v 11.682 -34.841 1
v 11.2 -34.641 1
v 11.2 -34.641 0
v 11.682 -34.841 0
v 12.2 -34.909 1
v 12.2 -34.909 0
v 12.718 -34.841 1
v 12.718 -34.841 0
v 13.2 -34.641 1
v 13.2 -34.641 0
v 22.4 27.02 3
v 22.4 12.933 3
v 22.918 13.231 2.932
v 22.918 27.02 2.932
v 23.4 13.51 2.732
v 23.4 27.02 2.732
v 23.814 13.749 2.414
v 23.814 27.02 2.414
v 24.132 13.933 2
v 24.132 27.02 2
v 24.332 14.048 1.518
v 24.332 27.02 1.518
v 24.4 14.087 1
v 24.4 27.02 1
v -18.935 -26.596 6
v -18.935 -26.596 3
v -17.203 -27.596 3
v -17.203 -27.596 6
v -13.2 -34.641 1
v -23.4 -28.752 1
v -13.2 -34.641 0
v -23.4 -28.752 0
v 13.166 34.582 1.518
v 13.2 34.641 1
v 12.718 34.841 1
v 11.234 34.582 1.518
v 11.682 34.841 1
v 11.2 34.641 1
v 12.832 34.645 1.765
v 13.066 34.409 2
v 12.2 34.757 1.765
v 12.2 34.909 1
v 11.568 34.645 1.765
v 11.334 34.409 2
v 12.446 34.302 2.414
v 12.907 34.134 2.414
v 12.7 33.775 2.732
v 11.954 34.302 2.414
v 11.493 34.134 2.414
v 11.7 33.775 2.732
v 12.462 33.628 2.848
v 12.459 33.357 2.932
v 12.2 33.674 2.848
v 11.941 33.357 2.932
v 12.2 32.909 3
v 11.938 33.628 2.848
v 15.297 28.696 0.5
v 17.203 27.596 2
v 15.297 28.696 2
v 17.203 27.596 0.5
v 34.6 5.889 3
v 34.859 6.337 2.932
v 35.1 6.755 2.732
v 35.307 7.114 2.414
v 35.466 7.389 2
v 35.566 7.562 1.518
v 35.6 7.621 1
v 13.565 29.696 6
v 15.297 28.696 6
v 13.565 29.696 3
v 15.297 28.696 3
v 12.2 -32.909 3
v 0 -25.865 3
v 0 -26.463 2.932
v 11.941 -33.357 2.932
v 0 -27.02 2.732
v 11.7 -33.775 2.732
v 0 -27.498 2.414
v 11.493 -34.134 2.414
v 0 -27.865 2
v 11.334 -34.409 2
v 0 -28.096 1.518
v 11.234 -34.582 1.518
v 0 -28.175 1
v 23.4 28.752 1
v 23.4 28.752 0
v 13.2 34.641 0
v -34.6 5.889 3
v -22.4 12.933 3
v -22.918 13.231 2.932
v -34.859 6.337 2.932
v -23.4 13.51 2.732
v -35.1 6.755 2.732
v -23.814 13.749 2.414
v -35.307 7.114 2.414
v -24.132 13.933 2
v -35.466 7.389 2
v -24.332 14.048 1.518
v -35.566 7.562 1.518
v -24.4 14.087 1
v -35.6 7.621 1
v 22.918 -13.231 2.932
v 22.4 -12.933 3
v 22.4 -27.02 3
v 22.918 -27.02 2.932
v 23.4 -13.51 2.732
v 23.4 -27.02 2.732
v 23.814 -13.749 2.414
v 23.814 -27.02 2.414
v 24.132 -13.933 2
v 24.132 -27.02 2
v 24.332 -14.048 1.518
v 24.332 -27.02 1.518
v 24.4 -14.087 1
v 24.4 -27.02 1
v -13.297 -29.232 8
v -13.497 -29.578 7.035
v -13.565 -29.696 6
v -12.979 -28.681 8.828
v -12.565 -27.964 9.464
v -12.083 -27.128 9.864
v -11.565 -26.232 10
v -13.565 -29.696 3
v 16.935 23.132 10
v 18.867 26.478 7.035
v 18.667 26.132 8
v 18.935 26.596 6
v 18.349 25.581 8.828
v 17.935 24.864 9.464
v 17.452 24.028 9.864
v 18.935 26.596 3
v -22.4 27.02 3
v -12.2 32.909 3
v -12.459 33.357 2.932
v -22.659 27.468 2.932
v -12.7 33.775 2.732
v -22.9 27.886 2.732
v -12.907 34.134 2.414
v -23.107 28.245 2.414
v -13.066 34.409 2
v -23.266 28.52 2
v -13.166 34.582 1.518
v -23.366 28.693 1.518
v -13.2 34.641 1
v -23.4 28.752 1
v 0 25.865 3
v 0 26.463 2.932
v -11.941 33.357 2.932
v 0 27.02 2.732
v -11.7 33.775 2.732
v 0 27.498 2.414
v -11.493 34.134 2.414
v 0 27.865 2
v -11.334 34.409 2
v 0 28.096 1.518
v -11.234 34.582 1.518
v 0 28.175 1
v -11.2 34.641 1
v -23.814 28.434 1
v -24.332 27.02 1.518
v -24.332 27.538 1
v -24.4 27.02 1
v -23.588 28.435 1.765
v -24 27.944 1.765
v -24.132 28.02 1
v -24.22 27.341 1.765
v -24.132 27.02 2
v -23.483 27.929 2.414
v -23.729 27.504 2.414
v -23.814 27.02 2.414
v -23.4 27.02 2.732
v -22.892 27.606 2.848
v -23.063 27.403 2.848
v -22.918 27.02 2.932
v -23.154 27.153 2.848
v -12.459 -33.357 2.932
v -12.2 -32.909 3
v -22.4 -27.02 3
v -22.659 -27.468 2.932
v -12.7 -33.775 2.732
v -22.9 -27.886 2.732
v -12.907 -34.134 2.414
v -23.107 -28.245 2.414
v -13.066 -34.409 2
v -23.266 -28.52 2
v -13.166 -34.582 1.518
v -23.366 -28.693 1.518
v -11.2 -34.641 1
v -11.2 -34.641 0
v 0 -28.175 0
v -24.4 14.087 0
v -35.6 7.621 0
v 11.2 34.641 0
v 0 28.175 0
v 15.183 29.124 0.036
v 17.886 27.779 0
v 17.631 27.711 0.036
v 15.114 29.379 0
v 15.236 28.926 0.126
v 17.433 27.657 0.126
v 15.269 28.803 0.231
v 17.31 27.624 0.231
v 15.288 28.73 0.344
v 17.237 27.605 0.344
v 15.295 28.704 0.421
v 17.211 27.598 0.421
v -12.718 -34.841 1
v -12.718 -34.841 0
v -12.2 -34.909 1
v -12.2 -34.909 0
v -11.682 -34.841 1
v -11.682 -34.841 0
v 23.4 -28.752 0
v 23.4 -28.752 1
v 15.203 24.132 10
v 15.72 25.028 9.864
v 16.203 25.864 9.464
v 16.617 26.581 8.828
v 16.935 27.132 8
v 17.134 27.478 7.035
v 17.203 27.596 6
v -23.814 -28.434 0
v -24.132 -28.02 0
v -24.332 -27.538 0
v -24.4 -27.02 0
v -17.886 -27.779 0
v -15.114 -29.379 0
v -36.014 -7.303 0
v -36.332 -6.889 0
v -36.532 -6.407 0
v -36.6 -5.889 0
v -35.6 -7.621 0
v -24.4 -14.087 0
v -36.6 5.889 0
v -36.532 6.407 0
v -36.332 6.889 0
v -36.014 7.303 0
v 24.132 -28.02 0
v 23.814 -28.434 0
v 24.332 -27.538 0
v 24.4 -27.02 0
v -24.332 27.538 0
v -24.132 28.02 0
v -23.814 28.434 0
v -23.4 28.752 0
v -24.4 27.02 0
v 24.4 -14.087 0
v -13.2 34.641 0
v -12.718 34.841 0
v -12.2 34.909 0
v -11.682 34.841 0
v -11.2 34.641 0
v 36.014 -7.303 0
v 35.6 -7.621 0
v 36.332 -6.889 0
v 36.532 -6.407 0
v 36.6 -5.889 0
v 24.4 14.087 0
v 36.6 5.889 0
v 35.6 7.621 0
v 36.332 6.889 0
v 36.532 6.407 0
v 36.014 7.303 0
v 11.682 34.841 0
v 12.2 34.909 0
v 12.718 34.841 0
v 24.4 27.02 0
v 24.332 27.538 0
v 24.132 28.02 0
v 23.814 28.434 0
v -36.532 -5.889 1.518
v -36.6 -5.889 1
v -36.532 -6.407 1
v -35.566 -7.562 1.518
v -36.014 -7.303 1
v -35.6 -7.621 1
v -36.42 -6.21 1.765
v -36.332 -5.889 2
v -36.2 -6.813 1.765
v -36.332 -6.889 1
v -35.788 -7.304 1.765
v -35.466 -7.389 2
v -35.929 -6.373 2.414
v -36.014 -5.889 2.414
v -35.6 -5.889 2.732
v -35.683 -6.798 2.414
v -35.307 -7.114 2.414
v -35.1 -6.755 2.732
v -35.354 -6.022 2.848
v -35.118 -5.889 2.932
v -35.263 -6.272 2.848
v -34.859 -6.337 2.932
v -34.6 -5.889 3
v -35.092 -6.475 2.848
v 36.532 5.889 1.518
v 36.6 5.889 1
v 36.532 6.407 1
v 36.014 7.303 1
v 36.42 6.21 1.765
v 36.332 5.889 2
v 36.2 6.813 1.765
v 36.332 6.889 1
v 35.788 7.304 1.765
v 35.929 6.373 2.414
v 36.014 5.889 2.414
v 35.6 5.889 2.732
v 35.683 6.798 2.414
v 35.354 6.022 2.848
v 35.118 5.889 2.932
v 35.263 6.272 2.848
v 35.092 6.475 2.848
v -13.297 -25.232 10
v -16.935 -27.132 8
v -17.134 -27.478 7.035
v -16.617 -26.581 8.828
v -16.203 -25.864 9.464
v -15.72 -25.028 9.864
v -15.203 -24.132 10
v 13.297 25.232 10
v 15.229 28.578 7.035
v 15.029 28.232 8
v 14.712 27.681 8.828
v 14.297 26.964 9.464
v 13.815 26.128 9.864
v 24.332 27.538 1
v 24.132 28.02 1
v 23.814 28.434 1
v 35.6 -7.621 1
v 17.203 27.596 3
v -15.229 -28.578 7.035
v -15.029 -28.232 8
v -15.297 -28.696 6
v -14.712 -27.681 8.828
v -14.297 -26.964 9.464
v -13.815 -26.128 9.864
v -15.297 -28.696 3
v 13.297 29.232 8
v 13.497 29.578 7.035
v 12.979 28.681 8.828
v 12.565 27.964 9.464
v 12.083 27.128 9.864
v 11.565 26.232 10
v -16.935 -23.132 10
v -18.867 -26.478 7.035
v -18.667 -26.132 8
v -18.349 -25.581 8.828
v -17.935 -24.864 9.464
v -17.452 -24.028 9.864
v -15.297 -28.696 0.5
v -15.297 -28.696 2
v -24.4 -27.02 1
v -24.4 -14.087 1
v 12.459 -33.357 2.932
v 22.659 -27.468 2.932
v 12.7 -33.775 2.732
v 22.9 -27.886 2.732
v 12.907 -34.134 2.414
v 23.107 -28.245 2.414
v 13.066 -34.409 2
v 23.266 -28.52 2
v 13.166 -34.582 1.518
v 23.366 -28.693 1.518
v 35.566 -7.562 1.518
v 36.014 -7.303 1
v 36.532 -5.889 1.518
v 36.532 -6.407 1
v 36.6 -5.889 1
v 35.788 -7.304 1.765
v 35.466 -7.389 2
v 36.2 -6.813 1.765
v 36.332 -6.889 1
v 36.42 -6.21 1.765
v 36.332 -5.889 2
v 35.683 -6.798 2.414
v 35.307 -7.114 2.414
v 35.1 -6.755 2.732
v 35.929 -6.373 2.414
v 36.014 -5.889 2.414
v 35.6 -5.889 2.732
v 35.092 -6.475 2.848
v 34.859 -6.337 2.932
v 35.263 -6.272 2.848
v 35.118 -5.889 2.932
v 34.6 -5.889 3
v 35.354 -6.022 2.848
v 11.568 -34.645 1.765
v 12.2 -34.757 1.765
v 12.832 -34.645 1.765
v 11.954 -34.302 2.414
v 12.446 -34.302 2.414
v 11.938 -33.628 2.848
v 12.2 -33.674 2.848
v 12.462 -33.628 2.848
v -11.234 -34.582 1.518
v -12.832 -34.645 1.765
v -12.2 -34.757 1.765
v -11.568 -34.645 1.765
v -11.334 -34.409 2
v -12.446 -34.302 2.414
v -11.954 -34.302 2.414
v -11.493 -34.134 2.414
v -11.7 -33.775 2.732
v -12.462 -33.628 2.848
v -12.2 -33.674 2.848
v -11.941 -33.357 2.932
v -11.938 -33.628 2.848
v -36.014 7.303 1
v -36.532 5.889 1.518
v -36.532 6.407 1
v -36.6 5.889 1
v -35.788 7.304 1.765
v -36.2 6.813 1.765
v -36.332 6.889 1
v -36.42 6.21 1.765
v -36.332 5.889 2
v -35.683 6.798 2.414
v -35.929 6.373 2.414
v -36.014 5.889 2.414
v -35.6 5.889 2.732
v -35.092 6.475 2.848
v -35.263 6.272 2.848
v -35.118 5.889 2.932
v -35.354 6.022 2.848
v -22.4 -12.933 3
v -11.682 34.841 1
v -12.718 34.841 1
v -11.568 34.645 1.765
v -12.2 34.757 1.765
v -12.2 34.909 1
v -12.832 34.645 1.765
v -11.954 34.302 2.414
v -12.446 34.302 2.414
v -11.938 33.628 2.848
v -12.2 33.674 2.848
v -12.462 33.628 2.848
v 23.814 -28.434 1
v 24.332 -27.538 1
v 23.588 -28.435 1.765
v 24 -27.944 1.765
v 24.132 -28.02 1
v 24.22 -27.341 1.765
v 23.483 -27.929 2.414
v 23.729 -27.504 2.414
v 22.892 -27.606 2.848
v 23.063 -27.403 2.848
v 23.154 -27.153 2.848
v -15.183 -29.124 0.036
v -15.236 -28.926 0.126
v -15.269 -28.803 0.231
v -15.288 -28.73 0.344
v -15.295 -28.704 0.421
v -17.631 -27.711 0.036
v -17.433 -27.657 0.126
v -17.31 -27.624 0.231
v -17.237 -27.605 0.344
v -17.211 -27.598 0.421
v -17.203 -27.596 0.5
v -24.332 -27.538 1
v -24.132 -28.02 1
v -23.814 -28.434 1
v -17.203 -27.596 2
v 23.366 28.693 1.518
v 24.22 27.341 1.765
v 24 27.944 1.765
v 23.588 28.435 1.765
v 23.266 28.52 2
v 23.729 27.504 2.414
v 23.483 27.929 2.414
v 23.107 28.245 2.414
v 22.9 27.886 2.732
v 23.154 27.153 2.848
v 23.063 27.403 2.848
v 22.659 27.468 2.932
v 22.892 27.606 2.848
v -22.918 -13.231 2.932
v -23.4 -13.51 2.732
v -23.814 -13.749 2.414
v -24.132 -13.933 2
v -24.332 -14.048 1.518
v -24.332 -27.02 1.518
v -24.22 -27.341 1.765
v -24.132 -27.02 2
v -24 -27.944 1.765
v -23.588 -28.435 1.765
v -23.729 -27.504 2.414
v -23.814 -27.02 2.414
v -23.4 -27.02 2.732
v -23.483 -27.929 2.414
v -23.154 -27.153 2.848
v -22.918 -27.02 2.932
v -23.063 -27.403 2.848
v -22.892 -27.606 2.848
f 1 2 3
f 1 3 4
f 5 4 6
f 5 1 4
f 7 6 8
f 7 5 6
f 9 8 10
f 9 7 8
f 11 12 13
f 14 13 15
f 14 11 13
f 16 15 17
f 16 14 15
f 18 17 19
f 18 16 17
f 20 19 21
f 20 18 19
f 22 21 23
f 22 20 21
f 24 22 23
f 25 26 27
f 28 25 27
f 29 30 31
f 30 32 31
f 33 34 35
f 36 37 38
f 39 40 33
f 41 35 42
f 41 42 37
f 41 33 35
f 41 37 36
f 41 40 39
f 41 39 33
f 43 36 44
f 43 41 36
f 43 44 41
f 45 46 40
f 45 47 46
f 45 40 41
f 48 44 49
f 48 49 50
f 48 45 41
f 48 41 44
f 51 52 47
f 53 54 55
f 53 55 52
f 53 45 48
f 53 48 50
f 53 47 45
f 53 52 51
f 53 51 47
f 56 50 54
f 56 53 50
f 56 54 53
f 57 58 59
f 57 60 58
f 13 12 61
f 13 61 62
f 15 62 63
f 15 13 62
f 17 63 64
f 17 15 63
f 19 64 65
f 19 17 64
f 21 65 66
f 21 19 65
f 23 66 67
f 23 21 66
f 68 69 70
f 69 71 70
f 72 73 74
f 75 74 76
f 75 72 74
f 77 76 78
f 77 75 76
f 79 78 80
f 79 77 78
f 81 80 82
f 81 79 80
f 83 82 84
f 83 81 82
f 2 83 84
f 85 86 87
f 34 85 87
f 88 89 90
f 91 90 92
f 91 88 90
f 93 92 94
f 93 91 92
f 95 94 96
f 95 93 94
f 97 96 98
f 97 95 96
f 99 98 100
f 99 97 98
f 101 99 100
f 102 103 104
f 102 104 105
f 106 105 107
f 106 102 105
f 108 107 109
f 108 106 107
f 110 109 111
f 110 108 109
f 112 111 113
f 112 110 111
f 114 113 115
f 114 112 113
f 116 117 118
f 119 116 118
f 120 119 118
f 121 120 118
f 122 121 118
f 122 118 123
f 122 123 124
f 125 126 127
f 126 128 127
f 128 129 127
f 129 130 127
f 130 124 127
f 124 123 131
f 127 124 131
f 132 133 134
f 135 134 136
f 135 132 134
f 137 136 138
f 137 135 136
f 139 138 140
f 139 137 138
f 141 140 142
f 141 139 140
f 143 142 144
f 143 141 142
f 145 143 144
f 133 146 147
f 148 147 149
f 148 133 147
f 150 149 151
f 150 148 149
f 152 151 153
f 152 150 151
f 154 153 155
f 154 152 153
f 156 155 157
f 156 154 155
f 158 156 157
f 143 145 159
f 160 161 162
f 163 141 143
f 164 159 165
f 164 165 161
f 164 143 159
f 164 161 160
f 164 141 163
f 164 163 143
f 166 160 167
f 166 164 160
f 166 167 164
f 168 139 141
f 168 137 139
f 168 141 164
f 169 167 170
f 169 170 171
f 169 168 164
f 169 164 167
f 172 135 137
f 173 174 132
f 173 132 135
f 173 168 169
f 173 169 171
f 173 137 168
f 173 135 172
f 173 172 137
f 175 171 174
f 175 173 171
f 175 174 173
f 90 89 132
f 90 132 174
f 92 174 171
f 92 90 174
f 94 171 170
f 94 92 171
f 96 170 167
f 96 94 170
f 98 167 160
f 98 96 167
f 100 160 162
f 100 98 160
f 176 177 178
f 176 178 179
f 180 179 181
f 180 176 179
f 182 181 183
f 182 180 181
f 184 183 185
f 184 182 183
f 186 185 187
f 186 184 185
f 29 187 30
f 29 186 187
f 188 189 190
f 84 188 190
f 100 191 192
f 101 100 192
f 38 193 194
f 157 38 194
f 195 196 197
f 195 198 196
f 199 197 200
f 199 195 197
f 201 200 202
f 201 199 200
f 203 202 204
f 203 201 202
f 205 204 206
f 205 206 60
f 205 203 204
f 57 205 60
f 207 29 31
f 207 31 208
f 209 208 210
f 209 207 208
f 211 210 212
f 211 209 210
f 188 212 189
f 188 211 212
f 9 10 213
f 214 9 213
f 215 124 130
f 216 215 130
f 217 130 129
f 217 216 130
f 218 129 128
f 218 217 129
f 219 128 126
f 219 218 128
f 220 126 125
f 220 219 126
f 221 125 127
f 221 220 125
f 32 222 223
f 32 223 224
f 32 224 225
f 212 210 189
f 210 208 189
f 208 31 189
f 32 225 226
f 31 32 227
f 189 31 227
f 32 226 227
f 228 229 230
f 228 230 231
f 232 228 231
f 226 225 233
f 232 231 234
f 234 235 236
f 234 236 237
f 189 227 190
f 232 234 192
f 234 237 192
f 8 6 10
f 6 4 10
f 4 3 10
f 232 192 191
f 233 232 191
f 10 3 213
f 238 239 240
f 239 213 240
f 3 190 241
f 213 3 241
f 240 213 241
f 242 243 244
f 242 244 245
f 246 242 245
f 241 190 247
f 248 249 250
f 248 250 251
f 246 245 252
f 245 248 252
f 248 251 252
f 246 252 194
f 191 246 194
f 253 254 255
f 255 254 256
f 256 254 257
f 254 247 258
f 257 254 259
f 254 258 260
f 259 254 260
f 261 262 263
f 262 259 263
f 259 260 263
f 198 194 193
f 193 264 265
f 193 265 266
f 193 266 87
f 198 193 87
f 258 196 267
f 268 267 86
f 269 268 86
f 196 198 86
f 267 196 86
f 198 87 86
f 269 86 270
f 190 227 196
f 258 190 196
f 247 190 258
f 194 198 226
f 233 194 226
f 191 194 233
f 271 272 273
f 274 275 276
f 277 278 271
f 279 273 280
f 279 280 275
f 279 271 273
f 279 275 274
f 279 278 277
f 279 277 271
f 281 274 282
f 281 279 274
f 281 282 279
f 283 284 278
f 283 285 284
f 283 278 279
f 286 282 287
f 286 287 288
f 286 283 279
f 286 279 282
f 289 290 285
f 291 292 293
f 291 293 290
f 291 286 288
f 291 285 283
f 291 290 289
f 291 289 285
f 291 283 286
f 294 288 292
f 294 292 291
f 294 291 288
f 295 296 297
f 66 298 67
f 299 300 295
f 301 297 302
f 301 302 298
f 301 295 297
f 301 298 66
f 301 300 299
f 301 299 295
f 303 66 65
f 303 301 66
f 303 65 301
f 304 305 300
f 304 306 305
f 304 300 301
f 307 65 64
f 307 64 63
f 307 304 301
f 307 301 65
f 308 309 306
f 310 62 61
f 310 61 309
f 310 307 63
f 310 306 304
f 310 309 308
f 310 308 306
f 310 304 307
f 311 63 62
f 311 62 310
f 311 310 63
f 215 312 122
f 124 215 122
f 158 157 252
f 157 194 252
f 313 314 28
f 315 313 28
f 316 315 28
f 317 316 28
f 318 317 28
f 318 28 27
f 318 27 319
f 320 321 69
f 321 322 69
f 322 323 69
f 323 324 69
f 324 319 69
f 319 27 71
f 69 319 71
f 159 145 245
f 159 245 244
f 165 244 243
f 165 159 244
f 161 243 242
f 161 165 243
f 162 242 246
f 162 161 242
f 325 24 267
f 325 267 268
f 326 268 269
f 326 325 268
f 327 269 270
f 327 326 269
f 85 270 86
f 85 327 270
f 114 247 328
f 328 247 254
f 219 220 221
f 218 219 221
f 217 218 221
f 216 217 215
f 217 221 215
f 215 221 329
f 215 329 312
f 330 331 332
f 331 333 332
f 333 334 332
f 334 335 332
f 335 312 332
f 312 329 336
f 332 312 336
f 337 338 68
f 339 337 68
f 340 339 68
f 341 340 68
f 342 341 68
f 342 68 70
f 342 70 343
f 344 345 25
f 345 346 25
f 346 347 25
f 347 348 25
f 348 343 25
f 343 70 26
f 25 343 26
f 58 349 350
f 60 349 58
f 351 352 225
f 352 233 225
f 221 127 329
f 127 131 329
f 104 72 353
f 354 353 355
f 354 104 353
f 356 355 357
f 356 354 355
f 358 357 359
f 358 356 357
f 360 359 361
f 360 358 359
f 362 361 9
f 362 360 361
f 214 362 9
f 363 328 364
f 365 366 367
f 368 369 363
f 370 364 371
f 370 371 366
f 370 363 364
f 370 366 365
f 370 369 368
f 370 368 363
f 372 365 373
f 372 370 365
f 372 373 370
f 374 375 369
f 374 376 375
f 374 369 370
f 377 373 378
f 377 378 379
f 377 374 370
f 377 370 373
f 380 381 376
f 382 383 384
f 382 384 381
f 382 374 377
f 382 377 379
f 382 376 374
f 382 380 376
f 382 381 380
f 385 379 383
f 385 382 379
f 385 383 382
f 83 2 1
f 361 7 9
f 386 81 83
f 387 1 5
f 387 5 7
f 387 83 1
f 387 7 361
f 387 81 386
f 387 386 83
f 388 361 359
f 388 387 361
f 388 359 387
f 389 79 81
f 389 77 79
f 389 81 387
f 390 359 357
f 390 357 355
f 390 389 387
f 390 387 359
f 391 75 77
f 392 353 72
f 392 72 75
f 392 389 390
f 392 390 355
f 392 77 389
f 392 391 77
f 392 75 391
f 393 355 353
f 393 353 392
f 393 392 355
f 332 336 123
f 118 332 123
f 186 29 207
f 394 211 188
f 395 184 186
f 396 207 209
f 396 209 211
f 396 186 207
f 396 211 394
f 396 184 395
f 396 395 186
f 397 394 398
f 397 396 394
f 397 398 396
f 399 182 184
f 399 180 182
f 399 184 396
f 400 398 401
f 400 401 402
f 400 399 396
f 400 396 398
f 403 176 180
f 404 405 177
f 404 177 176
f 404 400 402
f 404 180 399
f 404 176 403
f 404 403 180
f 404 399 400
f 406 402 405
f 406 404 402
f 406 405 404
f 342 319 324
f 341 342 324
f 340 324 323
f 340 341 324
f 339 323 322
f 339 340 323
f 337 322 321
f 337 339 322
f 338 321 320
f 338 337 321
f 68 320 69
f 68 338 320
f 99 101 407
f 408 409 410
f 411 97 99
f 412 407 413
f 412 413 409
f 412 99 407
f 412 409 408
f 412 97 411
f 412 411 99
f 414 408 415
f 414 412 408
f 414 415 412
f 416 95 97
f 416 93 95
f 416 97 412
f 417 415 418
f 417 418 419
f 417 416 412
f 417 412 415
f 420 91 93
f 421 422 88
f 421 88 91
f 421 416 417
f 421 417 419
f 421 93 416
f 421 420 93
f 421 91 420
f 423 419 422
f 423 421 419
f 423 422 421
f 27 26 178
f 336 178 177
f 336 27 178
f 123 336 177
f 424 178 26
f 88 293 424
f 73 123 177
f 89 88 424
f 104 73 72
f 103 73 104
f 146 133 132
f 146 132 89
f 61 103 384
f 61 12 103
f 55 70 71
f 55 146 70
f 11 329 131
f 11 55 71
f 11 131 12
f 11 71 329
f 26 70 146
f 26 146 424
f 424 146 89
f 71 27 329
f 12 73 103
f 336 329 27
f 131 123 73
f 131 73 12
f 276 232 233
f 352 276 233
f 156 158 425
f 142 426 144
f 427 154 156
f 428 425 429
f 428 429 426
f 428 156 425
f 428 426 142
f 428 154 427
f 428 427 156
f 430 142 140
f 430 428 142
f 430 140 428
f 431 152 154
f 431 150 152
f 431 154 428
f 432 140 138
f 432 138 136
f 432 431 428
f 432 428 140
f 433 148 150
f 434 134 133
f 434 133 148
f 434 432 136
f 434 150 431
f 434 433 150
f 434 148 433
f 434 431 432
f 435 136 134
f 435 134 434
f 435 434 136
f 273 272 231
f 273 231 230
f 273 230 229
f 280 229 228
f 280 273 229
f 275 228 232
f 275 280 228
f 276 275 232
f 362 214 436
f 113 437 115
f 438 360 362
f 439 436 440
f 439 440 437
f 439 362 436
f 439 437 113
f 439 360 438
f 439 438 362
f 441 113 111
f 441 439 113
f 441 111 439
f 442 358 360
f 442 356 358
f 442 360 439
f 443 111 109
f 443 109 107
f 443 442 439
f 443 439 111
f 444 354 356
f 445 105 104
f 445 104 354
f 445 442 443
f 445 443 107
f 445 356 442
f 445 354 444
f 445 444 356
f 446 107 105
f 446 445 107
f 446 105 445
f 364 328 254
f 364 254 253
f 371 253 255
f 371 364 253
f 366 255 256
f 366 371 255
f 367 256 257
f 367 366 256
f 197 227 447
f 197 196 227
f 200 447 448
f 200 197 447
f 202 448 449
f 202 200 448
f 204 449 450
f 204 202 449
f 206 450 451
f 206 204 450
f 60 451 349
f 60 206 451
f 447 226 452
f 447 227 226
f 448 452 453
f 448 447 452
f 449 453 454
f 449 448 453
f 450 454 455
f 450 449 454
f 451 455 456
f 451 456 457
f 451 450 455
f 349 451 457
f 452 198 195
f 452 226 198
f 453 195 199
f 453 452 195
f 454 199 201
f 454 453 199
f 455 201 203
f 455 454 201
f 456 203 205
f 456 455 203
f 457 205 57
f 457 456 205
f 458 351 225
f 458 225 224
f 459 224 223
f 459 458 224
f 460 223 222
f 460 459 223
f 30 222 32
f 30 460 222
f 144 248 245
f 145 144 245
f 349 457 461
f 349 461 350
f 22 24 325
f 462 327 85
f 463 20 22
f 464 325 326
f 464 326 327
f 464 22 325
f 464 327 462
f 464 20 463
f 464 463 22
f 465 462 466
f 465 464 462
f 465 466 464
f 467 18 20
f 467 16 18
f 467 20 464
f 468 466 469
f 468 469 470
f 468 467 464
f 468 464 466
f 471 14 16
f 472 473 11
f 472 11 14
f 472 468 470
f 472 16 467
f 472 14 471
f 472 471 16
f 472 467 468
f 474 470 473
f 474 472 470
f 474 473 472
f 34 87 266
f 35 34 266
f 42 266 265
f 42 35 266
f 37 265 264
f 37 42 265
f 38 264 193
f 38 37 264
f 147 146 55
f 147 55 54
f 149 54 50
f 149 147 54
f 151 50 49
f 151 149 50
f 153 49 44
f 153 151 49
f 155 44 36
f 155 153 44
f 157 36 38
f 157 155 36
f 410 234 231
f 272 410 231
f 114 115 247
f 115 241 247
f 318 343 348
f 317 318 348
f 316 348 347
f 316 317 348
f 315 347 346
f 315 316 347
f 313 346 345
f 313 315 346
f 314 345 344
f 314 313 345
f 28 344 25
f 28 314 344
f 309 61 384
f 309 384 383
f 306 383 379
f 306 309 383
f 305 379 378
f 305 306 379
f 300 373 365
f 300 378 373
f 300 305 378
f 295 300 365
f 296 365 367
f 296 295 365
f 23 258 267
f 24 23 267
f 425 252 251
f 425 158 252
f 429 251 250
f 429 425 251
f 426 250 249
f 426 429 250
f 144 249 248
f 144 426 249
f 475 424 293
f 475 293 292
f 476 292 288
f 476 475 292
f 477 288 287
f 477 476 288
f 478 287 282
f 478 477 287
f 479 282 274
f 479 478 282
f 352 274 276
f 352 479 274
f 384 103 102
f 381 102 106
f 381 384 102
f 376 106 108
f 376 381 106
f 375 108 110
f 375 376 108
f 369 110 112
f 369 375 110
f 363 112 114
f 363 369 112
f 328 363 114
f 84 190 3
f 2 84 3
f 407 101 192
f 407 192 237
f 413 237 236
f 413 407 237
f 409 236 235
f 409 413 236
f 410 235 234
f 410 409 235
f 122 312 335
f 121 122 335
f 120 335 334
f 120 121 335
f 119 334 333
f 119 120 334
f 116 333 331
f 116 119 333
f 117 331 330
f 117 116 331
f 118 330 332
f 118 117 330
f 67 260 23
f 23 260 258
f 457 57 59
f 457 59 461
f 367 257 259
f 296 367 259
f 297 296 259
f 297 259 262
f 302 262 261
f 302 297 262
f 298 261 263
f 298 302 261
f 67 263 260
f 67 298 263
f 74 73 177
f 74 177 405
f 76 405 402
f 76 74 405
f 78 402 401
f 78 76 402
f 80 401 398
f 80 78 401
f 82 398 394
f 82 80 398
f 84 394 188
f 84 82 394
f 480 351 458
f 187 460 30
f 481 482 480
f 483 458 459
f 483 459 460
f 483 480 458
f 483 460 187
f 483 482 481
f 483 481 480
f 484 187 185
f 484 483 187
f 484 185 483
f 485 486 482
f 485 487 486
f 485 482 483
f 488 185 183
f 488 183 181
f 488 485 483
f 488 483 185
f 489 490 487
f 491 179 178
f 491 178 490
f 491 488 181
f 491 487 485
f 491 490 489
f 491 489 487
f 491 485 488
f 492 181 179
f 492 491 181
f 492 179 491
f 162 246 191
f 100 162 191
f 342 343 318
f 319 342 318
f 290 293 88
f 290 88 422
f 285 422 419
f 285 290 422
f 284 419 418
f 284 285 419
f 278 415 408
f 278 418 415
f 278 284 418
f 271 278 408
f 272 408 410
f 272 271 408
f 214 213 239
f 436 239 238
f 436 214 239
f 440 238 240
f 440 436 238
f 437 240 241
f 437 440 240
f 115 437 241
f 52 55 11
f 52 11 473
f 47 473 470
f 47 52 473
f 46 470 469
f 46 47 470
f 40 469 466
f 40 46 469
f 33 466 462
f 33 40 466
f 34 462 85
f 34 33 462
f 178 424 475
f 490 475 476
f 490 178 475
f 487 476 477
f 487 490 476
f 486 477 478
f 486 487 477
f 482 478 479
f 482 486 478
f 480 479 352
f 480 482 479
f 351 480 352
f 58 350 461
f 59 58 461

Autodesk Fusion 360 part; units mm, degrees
sketch "Sketch3" plane through (0, 0, 0) normal (0, 0, 1) x (1, 0, 0)
  line L0 (12.2, 7.0437) -> (0, 14.0873)
  line L1 (0, 14.0873) -> (-12.2, 7.0437)
  line L2 (-12.2, 7.0437) -> (-12.2, -7.0437)
  line L3 (-12.2, -7.0437) -> (0, -14.0873)
  line L4 (0, -14.0873) -> (12.2, -7.0437)
  line L5 (12.2, -7.0437) -> (12.2, 7.0437)
  line L6 (0, -14.0873) -> (0, 14.0873) construction
  line L7 (24.4, 14.0873) -> (24.4, 28.1747)
  line L8 (24.4, 28.1747) -> (12.2, 35.2184)
  line L9 (12.2, 35.2184) -> (0, 28.1747)
  line L10 (0, 28.1747) -> (0, 14.0873)
  line L11 (0, 14.0873) -> (12.2, 7.0437)
  line L12 (12.2, 7.0437) -> (24.4, 14.0873)
  line L13 (0, 14.0873) -> (0, 28.1747)
  line L14 (0, 28.1747) -> (-12.2, 35.2184)
  line L15 (-12.2, 35.2184) -> (-24.4, 28.1747)
  line L16 (-24.4, 28.1747) -> (-24.4, 14.0873)
  line L17 (-24.4, 14.0873) -> (-12.2, 7.0437)
  line L18 (-12.2, 7.0437) -> (0, 14.0873)
  line L19 (36.6, -7.0437) -> (36.6, 7.0437)
  line L20 (36.6, 7.0437) -> (24.4, 14.0873)
  line L21 (24.4, 14.0873) -> (12.2, 7.0437)
  line L22 (12.2, 7.0437) -> (12.2, -7.0437)
  line L23 (12.2, -7.0437) -> (24.4, -14.0873)
  line L24 (24.4, -14.0873) -> (36.6, -7.0437)
  line L25 (-12.2, 7.0437) -> (-24.4, 14.0873)
  line L26 (-24.4, 14.0873) -> (-36.6, 7.0437)
  line L27 (-36.6, 7.0437) -> (-36.6, -7.0437)
  line L28 (-36.6, -7.0437) -> (-24.4, -14.0873)
  line L29 (-24.4, -14.0873) -> (-12.2, -7.0437)
  line L30 (-12.2, -7.0437) -> (-12.2, 7.0437)
  line L31 (-12.2, -7.0437) -> (-24.4, -14.0873)
  line L32 (-24.4, -14.0873) -> (-24.4, -28.1747)
  line L33 (-24.4, -28.1747) -> (-12.2, -35.2184)
  line L34 (-12.2, -35.2184) -> (0, -28.1747)
  line L35 (0, -28.1747) -> (0, -14.0873)
  line L36 (0, -14.0873) -> (-12.2, -7.0437)
  line L37 (24.4, -14.0873) -> (12.2, -7.0437)
  line L38 (12.2, -7.0437) -> (0, -14.0873)
  line L39 (0, -14.0873) -> (0, -28.1747)
  line L40 (0, -28.1747) -> (12.2, -35.2184)
  line L41 (12.2, -35.2184) -> (24.4, -28.1747)
  line L42 (24.4, -28.1747) -> (24.4, -14.0873)
  line L43 (0, 48) -> (0, -40) construction
  point P0 (12.2, 21.131)
  point P1 (-12.2, 21.131)
  point P2 (24.4, 0)
  point P3 (-24.4, 0)
  point P4 (-12.2, -21.131)
  point P5 (12.2, -21.131)
  dimension "d10" = 12.2
  dimension "d29" = 12.2
  dimension "d30" = 12.2
  dimension "d31" = 12.2
  dimension "d32" = 12.2
  dimension "d33" = 12.2
  dimension "d34" = 12.2
extrude "Extrude2" add sketch "Sketch3" along normal blind 3
sketch "Sketch4" plane through (0, 0, 3) normal (0, 0, 1) x (1, 0, 0)
  line L0 (13.5653, 29.6958) -> (-18.9347, -26.5958)
  line L1 (-18.9347, -26.5958) -> (-17.2026, -27.5958)
  line L2 (-17.2026, -27.5958) -> (15.2974, 28.6958)
  line L3 (15.2974, 28.6958) -> (13.5653, 29.6958)
  line L4 (17.2026, 27.5958) -> (-15.2974, -28.6958)
  line L5 (-15.2974, -28.6958) -> (-13.5653, -29.6958)
  line L6 (-13.5653, -29.6958) -> (18.9347, 26.5958)
  line L7 (18.9347, 26.5958) -> (17.2026, 27.5958)
  line L8 (-24.4, 14.0873) -> (24.4, -14.0873) construction
  line L9 (24.4, -28.1747) -> (24.4, -14.0873)
  line L10 (24.4, -14.0873) -> (36.6, -7.0437)
  line L11 (36.6, -7.0437) -> (36.6, 7.0437)
  line L12 (36.6, 7.0437) -> (24.4, 14.0873)
  line L13 (24.4, 14.0873) -> (24.4, 28.1747)
  line L14 (24.4, 28.1747) -> (12.2, 35.2184)
  line L15 (12.2, 35.2184) -> (0, 28.1747)
  line L16 (0, 28.1747) -> (-12.2, 35.2184)
  line L17 (-12.2, 35.2184) -> (-24.4, 28.1747)
  line L18 (-24.4, 28.1747) -> (-24.4, 14.0873)
  line L19 (-24.4, 14.0873) -> (-36.6, 7.0437)
  line L20 (-36.6, 7.0437) -> (-36.6, -7.0437)
  line L21 (-36.6, -7.0437) -> (-24.4, -14.0873)
  line L22 (-24.4, -14.0873) -> (-24.4, -28.1747)
  line L23 (-24.4, -28.1747) -> (-12.2, -35.2184)
  line L24 (-12.2, -35.2184) -> (0, -28.1747)
  line L25 (0, -28.1747) -> (12.2, -35.2184)
  line L26 (12.2, -35.2184) -> (24.4, -28.1747)
  line L27 (18.3, 31.6965) -> (-18.3, -31.6965)
  dimension "d13" = 65
  dimension "d14" = 2
  dimension "d15" = 2.2
extrude "Extrude3" add sketch "Sketch4" along normal blind 7 contours L0 L1 L2 L3 | L4 L5 L6 L7
sketch "Sketch5" plane through (0, 0, 0) normal (0, 0, -1) x (-1, 0, 0)
  line L0 (-17.2026, 27.5958) -> (-15.2974, 28.6958)
  line L1 (-15.2974, 28.6958) -> (17.2026, -27.5958)
  line L2 (17.2026, -27.5958) -> (15.2974, -28.6958)
  line L3 (15.2974, -28.6958) -> (-17.2026, 27.5958)
  line L4 (24.4, -28.1747) -> (12.2, -35.2184)
  line L5 (-24.4, 28.1747) -> (-12.2, 35.2184)
  line L6 (18.3, -31.6965) -> (-18.3, 31.6965) construction
  line L7 (24.4, 14.0873) -> (-24.4, -14.0873) construction
  line L8 (24.4, 14.0873) -> (36.6, 7.0437)
  point P0 (24.4, 14.0873)
  point P1 (-24.4, -14.0873)
  dimension "d18" = 65
  dimension "d19" = 2.2
extrude "Extrude4" cut sketch "Sketch5" against normal blind 2
fillet "Fillet1" radius 4 4 edges at (-14.4313, -29.1958, 10) (-18.0687, -27.0958, 10) (18.0687, 27.0958, 10) (14.4313, 29.1958, 10)
fillet "Fillet2" radius 2 12 edges at (-12.2, -35.2184, 1.5) (12.2, -35.2184, 1.5) (24.4, -28.1747, 1.5) (36.6, -7.0437, 1.5) (36.6, 7.0437, 1.5) (24.4, 28.1747, 1.5) (12.2, 35.2184, 1.5) (-12.2, 35.2184, 1.5) (-24.4, 28.1747, 1.5) (-36.6, 7.0437, 1.5) (-36.6, -7.0437, 1.5) (-24.4, -28.1747, 1.5)
fillet "Fillet3" radius 0.5 4 edges at (-16.25, -28.1458, 0) (-0.9526, 0.55, 0) (16.25, 28.1458, 0) (0.9526, -0.55, 0)
fillet "Fillet5" radius 2 30 edges at (-5.6, 31.4079, 3) (-12.2, 34.909, 3) (-18.3, 31.6965, 3) (-24.1321, 28.02, 3) (-24.4, 20.5537, 3) (24.4, 20.5537, 3) (24.1321, 28.02, 3) (18.3, 31.6965, 3) (12.2, 34.909, 3) (5.6, 31.4079, 3) (30, -10.8542, 3) (36.3321, -6.889, 3) (36.6, 0, 3) (36.3321, 6.889, 3) (30, 10.8542, 3) (5.6, -31.4079, 3) (12.2, -34.909, 3) (18.3, -31.6965, 3) (24.1321, -28.02, 3) (24.4, -20.5537, 3) (-24.4, -20.5537, 3) (-24.1321, -28.02, 3) (-18.3, -31.6965, 3) (-12.2, -34.909, 3) (-5.6, -31.4079, 3) (-30, 10.8542, 3) (-36.3321, 6.889, 3) (-36.6, 0, 3) (-36.3321, -6.889, 3) (-30, -10.8542, 3)
